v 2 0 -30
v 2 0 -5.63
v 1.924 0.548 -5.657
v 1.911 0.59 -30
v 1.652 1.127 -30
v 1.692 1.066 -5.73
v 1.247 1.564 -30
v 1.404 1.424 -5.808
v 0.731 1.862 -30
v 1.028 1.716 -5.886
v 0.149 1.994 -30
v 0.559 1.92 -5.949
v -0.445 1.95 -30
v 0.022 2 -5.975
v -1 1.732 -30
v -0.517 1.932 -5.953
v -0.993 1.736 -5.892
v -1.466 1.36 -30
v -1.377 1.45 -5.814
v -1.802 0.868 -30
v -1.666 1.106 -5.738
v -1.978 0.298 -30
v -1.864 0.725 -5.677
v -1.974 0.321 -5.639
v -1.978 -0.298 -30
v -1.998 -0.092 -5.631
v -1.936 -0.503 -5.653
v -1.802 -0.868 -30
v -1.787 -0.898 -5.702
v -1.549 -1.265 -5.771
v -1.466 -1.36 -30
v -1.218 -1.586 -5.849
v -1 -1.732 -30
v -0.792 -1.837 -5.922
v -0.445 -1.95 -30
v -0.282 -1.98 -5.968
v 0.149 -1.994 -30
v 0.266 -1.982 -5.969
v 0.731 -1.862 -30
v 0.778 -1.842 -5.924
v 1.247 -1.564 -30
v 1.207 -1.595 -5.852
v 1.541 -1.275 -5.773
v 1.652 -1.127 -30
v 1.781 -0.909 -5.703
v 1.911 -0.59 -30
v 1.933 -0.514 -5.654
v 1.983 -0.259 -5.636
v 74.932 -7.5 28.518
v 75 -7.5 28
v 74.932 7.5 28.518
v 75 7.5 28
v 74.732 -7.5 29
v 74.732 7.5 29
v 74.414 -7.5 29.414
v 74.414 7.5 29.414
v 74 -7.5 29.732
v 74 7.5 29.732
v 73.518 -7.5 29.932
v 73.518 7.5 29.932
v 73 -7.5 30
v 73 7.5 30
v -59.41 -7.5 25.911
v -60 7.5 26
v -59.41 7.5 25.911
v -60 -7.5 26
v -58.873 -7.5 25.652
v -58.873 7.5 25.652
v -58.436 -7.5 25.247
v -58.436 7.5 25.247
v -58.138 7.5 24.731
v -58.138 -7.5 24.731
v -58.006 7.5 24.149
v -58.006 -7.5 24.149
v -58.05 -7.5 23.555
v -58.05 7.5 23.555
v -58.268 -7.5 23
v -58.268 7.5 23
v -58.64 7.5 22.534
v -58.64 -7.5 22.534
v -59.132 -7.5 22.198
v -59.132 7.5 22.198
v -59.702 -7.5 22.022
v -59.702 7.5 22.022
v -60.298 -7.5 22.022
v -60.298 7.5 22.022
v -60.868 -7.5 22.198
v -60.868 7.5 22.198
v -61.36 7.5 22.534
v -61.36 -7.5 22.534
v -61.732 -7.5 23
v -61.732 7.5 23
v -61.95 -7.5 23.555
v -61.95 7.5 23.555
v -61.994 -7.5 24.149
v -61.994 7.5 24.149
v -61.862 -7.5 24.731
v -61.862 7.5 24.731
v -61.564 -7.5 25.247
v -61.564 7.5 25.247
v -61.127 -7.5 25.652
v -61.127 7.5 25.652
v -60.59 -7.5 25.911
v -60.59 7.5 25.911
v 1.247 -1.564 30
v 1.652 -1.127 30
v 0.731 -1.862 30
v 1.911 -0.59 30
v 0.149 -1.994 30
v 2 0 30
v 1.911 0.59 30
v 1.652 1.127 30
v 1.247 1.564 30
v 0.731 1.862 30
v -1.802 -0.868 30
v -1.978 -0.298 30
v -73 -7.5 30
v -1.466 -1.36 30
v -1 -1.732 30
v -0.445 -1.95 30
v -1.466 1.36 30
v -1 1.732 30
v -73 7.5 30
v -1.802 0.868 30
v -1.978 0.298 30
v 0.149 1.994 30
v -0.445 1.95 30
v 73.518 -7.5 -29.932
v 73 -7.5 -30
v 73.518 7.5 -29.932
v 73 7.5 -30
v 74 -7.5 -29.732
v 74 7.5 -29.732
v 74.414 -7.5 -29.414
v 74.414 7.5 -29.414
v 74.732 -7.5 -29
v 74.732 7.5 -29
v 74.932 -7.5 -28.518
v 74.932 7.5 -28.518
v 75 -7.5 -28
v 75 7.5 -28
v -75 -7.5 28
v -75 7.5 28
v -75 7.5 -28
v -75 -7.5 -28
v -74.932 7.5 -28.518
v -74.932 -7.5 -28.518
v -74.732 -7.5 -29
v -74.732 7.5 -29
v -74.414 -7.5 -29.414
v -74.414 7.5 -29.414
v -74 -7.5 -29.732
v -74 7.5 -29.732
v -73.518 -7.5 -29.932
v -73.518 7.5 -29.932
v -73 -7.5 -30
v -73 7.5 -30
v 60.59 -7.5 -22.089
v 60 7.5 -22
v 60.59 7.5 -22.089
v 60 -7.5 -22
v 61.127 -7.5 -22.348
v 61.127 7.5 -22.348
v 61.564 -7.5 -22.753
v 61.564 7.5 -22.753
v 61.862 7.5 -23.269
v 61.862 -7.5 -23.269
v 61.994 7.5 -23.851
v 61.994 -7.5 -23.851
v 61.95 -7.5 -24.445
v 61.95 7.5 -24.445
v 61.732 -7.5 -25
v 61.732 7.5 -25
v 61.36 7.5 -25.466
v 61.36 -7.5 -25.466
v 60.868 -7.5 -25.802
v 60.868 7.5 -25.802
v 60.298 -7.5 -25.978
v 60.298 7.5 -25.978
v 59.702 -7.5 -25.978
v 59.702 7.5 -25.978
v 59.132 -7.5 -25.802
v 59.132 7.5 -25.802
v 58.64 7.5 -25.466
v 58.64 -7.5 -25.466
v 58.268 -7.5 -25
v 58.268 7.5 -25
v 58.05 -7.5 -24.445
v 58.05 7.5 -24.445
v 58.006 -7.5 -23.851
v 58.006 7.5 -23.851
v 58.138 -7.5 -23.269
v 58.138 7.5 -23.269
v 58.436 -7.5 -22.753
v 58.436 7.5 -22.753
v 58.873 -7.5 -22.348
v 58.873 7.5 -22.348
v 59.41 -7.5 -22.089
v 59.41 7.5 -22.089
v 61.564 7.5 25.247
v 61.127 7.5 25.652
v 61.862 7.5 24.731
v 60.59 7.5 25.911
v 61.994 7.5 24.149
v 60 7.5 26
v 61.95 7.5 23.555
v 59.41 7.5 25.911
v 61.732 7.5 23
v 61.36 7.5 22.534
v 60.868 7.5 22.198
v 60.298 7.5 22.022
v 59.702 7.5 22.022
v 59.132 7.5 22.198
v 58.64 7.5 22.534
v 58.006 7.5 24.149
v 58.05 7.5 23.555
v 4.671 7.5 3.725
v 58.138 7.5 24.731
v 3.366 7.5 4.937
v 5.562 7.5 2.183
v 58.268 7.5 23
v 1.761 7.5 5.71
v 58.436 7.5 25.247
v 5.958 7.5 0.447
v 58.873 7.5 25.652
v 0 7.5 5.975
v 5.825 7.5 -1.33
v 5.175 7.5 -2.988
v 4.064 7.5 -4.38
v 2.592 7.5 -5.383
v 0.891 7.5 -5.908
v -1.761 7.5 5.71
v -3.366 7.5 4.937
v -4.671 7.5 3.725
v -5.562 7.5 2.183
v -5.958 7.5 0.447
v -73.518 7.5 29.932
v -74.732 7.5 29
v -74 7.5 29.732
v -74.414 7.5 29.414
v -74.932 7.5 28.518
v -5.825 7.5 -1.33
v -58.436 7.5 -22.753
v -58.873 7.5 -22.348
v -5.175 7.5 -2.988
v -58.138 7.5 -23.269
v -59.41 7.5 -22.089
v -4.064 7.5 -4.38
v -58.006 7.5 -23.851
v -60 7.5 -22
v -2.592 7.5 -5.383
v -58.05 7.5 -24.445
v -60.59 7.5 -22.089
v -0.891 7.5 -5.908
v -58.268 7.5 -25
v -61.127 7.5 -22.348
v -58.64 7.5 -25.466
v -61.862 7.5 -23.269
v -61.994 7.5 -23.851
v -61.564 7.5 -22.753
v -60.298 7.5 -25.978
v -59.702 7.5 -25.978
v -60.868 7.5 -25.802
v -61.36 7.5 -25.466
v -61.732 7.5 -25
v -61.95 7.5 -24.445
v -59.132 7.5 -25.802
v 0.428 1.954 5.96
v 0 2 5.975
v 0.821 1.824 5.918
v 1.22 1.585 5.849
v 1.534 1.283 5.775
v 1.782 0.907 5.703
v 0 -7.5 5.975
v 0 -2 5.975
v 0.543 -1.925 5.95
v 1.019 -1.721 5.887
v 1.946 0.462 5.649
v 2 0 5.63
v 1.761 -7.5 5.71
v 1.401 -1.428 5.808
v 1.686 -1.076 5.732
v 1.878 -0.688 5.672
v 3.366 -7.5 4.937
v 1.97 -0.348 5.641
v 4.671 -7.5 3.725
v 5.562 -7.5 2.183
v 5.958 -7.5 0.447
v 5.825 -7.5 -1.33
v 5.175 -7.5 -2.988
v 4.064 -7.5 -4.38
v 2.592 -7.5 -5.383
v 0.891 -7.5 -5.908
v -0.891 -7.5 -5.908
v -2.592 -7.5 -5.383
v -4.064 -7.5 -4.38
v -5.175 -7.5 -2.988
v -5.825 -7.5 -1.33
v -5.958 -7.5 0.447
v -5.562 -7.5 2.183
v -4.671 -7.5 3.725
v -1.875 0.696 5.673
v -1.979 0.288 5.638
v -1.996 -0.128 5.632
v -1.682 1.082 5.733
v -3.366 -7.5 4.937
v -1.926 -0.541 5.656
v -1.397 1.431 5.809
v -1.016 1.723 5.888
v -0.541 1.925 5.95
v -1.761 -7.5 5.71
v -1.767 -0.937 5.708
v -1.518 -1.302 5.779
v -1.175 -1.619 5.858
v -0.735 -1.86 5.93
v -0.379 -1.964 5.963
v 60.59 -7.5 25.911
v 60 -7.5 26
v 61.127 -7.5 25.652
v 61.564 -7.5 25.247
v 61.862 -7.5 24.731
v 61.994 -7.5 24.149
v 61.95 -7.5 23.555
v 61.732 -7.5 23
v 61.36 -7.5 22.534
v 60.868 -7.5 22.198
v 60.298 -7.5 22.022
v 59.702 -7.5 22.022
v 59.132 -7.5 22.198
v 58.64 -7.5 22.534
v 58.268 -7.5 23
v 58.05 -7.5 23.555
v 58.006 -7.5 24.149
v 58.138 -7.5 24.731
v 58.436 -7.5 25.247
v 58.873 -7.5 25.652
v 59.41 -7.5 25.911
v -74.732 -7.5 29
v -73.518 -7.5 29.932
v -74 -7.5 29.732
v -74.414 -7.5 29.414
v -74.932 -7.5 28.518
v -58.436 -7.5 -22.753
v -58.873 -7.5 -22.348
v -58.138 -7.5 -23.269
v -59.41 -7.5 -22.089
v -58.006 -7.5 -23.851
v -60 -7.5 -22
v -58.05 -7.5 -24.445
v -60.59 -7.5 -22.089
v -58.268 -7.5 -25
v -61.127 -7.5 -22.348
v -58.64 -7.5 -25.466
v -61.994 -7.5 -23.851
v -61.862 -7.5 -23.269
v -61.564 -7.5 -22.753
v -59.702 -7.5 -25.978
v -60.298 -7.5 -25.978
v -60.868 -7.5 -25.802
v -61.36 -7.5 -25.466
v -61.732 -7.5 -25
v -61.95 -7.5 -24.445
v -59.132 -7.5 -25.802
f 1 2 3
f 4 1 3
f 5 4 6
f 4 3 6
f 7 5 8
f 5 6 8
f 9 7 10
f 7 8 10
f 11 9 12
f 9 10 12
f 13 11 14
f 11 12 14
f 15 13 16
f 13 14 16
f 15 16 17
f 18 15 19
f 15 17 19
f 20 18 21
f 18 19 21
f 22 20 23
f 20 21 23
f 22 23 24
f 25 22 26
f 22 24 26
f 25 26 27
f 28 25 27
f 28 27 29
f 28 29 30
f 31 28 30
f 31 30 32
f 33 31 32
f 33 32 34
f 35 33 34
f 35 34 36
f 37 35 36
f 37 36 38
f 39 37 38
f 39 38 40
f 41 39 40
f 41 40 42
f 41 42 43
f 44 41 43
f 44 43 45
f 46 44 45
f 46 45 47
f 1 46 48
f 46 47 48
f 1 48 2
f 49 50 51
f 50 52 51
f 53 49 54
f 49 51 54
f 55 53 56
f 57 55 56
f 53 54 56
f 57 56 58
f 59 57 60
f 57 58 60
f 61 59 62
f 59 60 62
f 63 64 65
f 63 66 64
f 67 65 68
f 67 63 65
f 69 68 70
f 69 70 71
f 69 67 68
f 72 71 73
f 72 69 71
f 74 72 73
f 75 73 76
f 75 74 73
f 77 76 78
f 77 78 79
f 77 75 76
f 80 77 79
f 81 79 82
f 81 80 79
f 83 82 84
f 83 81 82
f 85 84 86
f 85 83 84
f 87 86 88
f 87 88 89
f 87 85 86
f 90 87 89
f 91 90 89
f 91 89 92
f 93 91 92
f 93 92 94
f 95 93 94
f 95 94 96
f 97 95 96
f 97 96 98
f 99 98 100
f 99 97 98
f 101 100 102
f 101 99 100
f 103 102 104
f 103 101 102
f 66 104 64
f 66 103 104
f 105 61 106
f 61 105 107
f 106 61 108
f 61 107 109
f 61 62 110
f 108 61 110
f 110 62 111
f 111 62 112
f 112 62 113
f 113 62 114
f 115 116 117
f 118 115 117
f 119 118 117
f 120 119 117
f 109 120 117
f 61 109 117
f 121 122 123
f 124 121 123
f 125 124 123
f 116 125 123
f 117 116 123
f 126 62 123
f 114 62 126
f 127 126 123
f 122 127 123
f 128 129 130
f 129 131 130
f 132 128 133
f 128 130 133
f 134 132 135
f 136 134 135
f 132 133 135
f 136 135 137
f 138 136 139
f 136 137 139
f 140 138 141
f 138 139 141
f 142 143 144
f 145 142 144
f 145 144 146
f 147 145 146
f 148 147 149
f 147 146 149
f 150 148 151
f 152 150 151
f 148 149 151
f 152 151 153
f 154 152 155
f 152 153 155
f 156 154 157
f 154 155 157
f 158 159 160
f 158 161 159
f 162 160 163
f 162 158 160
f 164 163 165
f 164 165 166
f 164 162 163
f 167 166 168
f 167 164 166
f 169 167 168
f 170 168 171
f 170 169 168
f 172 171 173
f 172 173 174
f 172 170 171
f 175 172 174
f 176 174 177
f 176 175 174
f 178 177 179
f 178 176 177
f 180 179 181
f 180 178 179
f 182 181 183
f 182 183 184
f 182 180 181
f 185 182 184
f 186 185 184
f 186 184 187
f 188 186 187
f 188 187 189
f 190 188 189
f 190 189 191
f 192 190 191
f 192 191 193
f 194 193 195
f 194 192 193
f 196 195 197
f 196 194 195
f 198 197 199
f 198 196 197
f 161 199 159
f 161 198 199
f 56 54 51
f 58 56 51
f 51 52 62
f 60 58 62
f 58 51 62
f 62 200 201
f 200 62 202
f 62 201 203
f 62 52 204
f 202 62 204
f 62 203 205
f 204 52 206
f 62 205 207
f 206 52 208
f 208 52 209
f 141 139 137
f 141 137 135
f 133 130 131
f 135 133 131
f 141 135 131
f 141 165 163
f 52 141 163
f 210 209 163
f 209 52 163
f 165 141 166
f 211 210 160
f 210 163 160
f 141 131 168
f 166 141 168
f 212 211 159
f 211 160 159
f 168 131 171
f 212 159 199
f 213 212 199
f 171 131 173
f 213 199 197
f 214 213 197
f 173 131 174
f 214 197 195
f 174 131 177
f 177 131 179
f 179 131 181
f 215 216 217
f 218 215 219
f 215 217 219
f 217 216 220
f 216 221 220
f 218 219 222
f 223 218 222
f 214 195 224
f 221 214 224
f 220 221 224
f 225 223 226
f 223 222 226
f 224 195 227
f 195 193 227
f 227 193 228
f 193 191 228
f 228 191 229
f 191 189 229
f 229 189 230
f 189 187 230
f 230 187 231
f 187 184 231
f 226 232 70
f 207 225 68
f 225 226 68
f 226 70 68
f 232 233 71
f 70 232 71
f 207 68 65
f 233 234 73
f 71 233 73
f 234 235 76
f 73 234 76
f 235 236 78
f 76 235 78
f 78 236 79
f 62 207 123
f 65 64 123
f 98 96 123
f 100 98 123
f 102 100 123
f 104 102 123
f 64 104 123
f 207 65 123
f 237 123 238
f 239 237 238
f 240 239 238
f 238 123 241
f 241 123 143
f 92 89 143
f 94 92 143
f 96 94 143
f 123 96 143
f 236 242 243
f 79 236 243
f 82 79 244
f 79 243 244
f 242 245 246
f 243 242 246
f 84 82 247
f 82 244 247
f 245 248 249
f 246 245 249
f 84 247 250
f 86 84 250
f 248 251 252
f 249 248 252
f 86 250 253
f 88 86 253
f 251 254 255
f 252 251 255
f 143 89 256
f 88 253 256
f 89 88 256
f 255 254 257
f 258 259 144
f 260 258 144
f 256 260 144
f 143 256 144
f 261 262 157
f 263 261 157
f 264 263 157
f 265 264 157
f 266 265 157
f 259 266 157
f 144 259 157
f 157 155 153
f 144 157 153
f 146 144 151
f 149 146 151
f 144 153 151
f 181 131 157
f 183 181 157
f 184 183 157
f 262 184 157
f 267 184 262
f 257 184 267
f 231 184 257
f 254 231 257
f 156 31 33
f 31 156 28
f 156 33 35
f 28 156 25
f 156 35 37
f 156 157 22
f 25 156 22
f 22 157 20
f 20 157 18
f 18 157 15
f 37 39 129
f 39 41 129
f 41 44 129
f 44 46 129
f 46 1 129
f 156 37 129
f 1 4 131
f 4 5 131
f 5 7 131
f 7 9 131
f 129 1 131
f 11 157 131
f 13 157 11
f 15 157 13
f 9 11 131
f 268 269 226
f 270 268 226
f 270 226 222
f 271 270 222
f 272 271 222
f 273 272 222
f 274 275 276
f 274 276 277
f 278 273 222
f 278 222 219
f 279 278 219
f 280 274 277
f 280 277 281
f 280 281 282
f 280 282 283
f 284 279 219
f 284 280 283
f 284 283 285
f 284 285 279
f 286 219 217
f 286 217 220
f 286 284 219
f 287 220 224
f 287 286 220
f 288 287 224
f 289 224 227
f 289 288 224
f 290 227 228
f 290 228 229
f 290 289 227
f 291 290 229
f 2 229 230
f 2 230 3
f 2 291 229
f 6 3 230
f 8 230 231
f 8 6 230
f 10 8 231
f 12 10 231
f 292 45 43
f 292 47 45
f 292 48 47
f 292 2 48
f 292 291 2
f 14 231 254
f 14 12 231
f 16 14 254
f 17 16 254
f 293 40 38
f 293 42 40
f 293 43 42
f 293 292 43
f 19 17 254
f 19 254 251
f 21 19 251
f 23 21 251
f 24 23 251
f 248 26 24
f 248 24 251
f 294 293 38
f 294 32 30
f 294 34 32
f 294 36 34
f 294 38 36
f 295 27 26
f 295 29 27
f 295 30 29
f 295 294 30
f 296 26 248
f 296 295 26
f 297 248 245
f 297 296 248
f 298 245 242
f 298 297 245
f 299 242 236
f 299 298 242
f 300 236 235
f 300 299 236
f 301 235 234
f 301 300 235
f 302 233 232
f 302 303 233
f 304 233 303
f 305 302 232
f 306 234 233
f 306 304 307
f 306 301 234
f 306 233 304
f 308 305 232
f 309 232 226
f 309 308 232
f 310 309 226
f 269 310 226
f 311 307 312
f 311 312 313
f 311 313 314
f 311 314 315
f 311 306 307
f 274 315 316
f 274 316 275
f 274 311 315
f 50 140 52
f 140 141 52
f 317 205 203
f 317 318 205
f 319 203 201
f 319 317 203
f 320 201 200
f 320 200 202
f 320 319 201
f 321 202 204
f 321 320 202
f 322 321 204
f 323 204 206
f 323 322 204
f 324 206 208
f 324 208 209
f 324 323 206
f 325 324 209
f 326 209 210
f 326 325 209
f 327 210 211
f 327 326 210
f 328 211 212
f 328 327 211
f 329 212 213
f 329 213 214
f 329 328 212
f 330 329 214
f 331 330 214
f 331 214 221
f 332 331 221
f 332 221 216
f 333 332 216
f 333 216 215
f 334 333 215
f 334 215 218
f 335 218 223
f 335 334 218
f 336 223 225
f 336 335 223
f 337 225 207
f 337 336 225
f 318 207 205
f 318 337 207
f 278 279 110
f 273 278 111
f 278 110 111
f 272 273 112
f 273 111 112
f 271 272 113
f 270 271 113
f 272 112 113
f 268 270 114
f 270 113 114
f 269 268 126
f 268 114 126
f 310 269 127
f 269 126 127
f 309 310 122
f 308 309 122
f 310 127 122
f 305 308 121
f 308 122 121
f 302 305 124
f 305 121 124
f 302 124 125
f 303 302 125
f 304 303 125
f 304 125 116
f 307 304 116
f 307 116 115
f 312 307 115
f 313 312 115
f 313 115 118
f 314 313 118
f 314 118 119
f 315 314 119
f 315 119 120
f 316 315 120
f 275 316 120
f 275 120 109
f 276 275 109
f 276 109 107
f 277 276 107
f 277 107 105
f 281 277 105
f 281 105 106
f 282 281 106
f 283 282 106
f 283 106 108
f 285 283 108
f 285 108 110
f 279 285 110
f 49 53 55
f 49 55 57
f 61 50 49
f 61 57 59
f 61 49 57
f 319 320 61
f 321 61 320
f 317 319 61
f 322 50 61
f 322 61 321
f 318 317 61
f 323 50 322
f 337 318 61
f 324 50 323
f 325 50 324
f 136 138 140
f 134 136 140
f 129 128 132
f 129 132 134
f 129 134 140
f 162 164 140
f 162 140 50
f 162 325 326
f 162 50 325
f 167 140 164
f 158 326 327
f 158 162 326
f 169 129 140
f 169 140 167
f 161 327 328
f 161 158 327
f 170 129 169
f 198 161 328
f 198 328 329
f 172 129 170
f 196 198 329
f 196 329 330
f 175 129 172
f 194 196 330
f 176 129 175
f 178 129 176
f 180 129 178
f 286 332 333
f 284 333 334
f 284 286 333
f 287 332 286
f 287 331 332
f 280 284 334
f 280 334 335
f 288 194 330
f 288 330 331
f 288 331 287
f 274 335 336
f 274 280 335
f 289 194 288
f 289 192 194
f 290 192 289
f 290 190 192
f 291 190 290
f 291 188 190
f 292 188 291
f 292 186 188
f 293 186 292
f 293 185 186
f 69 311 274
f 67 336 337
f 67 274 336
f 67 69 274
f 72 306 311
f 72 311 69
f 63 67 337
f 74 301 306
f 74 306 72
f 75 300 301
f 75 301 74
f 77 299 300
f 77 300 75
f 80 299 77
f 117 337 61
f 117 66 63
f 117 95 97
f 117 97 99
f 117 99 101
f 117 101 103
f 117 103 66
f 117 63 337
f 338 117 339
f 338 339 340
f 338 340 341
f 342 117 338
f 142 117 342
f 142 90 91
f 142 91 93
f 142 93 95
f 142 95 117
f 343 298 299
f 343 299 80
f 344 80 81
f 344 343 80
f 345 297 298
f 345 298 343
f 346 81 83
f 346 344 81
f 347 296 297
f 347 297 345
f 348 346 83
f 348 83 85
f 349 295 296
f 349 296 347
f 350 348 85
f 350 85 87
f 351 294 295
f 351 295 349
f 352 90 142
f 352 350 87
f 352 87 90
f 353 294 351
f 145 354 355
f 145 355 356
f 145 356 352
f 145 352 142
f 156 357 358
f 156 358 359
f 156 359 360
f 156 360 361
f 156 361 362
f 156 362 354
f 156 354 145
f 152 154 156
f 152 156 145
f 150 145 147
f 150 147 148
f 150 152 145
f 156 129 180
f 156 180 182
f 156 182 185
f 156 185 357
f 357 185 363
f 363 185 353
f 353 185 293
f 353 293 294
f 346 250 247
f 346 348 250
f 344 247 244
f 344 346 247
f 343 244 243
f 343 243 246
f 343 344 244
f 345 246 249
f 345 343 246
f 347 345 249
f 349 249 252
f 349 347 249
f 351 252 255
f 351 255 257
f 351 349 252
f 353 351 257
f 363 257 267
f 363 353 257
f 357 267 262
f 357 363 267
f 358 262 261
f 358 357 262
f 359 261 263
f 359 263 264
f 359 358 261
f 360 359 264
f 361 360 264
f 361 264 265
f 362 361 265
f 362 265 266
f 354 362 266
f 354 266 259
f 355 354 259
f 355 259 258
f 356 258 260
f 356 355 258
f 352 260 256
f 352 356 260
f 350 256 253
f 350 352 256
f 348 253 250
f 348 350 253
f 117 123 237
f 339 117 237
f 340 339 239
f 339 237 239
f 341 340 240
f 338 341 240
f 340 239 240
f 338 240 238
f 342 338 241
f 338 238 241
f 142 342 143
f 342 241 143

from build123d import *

# Parameters (mm, degrees)
SKETCH1_R           = 5.975
SKETCH1_R_2         = 2
BOSS_EXTRUDE1_DEPTH = 7.5
SKETCH2_R           = 2
CUT_EXTRUDE1_DEPTH  = 97.33924434


with BuildPart() as part:
    # Sketch1 → Boss-Extrude1 (new, symmetric)
    with BuildSketch(Plane(origin=(0, 0, 0), x_dir=(1, 0, 0), z_dir=(0, 1, 0))):
        with BuildLine():
            Line((-73, 30), (73, 30))
            ThreePointArc((73, 30), (74.414213562, 29.414213562), (75, 28))
            Line((75, 28), (75, -28))
            ThreePointArc((75, -28), (74.414213562, -29.414213562), (73, -30))
            Line((73, -30), (-73, -30))
            ThreePointArc((-73, -30), (-74.414213562, -29.414213562), (-75, -28))
            Line((-75, -28), (-75, 28))
            ThreePointArc((-75, 28), (-74.414213562, 29.414213562), (-73, 30))
        make_face()
        with Locations(Location((0, 0, 0), (0, 0, 270))):
            Circle(SKETCH1_R, mode=Mode.SUBTRACT)
        with Locations(Location((-60, 24, 0), (0, 0, 270))):
            Circle(SKETCH1_R_2, mode=Mode.SUBTRACT)
        with Locations(Location((-60, -24, 0), (0, 0, 270))):
            Circle(SKETCH1_R_2, mode=Mode.SUBTRACT)
        with Locations(Location((60, -24, 0), (0, 0, 270))):
            Circle(SKETCH1_R_2, mode=Mode.SUBTRACT)
        with Locations(Location((60, 24, 0), (0, 0, 270))):
            Circle(SKETCH1_R_2, mode=Mode.SUBTRACT)
    extrude(amount=BOSS_EXTRUDE1_DEPTH, both=True)

    # Sketch2 → Cut-Extrude1 (cut, through all)
    with BuildSketch(Plane.XY.offset(30)):
        Circle(SKETCH2_R)
    extrude(amount=-CUT_EXTRUDE1_DEPTH, mode=Mode.SUBTRACT)


solid = part.part
